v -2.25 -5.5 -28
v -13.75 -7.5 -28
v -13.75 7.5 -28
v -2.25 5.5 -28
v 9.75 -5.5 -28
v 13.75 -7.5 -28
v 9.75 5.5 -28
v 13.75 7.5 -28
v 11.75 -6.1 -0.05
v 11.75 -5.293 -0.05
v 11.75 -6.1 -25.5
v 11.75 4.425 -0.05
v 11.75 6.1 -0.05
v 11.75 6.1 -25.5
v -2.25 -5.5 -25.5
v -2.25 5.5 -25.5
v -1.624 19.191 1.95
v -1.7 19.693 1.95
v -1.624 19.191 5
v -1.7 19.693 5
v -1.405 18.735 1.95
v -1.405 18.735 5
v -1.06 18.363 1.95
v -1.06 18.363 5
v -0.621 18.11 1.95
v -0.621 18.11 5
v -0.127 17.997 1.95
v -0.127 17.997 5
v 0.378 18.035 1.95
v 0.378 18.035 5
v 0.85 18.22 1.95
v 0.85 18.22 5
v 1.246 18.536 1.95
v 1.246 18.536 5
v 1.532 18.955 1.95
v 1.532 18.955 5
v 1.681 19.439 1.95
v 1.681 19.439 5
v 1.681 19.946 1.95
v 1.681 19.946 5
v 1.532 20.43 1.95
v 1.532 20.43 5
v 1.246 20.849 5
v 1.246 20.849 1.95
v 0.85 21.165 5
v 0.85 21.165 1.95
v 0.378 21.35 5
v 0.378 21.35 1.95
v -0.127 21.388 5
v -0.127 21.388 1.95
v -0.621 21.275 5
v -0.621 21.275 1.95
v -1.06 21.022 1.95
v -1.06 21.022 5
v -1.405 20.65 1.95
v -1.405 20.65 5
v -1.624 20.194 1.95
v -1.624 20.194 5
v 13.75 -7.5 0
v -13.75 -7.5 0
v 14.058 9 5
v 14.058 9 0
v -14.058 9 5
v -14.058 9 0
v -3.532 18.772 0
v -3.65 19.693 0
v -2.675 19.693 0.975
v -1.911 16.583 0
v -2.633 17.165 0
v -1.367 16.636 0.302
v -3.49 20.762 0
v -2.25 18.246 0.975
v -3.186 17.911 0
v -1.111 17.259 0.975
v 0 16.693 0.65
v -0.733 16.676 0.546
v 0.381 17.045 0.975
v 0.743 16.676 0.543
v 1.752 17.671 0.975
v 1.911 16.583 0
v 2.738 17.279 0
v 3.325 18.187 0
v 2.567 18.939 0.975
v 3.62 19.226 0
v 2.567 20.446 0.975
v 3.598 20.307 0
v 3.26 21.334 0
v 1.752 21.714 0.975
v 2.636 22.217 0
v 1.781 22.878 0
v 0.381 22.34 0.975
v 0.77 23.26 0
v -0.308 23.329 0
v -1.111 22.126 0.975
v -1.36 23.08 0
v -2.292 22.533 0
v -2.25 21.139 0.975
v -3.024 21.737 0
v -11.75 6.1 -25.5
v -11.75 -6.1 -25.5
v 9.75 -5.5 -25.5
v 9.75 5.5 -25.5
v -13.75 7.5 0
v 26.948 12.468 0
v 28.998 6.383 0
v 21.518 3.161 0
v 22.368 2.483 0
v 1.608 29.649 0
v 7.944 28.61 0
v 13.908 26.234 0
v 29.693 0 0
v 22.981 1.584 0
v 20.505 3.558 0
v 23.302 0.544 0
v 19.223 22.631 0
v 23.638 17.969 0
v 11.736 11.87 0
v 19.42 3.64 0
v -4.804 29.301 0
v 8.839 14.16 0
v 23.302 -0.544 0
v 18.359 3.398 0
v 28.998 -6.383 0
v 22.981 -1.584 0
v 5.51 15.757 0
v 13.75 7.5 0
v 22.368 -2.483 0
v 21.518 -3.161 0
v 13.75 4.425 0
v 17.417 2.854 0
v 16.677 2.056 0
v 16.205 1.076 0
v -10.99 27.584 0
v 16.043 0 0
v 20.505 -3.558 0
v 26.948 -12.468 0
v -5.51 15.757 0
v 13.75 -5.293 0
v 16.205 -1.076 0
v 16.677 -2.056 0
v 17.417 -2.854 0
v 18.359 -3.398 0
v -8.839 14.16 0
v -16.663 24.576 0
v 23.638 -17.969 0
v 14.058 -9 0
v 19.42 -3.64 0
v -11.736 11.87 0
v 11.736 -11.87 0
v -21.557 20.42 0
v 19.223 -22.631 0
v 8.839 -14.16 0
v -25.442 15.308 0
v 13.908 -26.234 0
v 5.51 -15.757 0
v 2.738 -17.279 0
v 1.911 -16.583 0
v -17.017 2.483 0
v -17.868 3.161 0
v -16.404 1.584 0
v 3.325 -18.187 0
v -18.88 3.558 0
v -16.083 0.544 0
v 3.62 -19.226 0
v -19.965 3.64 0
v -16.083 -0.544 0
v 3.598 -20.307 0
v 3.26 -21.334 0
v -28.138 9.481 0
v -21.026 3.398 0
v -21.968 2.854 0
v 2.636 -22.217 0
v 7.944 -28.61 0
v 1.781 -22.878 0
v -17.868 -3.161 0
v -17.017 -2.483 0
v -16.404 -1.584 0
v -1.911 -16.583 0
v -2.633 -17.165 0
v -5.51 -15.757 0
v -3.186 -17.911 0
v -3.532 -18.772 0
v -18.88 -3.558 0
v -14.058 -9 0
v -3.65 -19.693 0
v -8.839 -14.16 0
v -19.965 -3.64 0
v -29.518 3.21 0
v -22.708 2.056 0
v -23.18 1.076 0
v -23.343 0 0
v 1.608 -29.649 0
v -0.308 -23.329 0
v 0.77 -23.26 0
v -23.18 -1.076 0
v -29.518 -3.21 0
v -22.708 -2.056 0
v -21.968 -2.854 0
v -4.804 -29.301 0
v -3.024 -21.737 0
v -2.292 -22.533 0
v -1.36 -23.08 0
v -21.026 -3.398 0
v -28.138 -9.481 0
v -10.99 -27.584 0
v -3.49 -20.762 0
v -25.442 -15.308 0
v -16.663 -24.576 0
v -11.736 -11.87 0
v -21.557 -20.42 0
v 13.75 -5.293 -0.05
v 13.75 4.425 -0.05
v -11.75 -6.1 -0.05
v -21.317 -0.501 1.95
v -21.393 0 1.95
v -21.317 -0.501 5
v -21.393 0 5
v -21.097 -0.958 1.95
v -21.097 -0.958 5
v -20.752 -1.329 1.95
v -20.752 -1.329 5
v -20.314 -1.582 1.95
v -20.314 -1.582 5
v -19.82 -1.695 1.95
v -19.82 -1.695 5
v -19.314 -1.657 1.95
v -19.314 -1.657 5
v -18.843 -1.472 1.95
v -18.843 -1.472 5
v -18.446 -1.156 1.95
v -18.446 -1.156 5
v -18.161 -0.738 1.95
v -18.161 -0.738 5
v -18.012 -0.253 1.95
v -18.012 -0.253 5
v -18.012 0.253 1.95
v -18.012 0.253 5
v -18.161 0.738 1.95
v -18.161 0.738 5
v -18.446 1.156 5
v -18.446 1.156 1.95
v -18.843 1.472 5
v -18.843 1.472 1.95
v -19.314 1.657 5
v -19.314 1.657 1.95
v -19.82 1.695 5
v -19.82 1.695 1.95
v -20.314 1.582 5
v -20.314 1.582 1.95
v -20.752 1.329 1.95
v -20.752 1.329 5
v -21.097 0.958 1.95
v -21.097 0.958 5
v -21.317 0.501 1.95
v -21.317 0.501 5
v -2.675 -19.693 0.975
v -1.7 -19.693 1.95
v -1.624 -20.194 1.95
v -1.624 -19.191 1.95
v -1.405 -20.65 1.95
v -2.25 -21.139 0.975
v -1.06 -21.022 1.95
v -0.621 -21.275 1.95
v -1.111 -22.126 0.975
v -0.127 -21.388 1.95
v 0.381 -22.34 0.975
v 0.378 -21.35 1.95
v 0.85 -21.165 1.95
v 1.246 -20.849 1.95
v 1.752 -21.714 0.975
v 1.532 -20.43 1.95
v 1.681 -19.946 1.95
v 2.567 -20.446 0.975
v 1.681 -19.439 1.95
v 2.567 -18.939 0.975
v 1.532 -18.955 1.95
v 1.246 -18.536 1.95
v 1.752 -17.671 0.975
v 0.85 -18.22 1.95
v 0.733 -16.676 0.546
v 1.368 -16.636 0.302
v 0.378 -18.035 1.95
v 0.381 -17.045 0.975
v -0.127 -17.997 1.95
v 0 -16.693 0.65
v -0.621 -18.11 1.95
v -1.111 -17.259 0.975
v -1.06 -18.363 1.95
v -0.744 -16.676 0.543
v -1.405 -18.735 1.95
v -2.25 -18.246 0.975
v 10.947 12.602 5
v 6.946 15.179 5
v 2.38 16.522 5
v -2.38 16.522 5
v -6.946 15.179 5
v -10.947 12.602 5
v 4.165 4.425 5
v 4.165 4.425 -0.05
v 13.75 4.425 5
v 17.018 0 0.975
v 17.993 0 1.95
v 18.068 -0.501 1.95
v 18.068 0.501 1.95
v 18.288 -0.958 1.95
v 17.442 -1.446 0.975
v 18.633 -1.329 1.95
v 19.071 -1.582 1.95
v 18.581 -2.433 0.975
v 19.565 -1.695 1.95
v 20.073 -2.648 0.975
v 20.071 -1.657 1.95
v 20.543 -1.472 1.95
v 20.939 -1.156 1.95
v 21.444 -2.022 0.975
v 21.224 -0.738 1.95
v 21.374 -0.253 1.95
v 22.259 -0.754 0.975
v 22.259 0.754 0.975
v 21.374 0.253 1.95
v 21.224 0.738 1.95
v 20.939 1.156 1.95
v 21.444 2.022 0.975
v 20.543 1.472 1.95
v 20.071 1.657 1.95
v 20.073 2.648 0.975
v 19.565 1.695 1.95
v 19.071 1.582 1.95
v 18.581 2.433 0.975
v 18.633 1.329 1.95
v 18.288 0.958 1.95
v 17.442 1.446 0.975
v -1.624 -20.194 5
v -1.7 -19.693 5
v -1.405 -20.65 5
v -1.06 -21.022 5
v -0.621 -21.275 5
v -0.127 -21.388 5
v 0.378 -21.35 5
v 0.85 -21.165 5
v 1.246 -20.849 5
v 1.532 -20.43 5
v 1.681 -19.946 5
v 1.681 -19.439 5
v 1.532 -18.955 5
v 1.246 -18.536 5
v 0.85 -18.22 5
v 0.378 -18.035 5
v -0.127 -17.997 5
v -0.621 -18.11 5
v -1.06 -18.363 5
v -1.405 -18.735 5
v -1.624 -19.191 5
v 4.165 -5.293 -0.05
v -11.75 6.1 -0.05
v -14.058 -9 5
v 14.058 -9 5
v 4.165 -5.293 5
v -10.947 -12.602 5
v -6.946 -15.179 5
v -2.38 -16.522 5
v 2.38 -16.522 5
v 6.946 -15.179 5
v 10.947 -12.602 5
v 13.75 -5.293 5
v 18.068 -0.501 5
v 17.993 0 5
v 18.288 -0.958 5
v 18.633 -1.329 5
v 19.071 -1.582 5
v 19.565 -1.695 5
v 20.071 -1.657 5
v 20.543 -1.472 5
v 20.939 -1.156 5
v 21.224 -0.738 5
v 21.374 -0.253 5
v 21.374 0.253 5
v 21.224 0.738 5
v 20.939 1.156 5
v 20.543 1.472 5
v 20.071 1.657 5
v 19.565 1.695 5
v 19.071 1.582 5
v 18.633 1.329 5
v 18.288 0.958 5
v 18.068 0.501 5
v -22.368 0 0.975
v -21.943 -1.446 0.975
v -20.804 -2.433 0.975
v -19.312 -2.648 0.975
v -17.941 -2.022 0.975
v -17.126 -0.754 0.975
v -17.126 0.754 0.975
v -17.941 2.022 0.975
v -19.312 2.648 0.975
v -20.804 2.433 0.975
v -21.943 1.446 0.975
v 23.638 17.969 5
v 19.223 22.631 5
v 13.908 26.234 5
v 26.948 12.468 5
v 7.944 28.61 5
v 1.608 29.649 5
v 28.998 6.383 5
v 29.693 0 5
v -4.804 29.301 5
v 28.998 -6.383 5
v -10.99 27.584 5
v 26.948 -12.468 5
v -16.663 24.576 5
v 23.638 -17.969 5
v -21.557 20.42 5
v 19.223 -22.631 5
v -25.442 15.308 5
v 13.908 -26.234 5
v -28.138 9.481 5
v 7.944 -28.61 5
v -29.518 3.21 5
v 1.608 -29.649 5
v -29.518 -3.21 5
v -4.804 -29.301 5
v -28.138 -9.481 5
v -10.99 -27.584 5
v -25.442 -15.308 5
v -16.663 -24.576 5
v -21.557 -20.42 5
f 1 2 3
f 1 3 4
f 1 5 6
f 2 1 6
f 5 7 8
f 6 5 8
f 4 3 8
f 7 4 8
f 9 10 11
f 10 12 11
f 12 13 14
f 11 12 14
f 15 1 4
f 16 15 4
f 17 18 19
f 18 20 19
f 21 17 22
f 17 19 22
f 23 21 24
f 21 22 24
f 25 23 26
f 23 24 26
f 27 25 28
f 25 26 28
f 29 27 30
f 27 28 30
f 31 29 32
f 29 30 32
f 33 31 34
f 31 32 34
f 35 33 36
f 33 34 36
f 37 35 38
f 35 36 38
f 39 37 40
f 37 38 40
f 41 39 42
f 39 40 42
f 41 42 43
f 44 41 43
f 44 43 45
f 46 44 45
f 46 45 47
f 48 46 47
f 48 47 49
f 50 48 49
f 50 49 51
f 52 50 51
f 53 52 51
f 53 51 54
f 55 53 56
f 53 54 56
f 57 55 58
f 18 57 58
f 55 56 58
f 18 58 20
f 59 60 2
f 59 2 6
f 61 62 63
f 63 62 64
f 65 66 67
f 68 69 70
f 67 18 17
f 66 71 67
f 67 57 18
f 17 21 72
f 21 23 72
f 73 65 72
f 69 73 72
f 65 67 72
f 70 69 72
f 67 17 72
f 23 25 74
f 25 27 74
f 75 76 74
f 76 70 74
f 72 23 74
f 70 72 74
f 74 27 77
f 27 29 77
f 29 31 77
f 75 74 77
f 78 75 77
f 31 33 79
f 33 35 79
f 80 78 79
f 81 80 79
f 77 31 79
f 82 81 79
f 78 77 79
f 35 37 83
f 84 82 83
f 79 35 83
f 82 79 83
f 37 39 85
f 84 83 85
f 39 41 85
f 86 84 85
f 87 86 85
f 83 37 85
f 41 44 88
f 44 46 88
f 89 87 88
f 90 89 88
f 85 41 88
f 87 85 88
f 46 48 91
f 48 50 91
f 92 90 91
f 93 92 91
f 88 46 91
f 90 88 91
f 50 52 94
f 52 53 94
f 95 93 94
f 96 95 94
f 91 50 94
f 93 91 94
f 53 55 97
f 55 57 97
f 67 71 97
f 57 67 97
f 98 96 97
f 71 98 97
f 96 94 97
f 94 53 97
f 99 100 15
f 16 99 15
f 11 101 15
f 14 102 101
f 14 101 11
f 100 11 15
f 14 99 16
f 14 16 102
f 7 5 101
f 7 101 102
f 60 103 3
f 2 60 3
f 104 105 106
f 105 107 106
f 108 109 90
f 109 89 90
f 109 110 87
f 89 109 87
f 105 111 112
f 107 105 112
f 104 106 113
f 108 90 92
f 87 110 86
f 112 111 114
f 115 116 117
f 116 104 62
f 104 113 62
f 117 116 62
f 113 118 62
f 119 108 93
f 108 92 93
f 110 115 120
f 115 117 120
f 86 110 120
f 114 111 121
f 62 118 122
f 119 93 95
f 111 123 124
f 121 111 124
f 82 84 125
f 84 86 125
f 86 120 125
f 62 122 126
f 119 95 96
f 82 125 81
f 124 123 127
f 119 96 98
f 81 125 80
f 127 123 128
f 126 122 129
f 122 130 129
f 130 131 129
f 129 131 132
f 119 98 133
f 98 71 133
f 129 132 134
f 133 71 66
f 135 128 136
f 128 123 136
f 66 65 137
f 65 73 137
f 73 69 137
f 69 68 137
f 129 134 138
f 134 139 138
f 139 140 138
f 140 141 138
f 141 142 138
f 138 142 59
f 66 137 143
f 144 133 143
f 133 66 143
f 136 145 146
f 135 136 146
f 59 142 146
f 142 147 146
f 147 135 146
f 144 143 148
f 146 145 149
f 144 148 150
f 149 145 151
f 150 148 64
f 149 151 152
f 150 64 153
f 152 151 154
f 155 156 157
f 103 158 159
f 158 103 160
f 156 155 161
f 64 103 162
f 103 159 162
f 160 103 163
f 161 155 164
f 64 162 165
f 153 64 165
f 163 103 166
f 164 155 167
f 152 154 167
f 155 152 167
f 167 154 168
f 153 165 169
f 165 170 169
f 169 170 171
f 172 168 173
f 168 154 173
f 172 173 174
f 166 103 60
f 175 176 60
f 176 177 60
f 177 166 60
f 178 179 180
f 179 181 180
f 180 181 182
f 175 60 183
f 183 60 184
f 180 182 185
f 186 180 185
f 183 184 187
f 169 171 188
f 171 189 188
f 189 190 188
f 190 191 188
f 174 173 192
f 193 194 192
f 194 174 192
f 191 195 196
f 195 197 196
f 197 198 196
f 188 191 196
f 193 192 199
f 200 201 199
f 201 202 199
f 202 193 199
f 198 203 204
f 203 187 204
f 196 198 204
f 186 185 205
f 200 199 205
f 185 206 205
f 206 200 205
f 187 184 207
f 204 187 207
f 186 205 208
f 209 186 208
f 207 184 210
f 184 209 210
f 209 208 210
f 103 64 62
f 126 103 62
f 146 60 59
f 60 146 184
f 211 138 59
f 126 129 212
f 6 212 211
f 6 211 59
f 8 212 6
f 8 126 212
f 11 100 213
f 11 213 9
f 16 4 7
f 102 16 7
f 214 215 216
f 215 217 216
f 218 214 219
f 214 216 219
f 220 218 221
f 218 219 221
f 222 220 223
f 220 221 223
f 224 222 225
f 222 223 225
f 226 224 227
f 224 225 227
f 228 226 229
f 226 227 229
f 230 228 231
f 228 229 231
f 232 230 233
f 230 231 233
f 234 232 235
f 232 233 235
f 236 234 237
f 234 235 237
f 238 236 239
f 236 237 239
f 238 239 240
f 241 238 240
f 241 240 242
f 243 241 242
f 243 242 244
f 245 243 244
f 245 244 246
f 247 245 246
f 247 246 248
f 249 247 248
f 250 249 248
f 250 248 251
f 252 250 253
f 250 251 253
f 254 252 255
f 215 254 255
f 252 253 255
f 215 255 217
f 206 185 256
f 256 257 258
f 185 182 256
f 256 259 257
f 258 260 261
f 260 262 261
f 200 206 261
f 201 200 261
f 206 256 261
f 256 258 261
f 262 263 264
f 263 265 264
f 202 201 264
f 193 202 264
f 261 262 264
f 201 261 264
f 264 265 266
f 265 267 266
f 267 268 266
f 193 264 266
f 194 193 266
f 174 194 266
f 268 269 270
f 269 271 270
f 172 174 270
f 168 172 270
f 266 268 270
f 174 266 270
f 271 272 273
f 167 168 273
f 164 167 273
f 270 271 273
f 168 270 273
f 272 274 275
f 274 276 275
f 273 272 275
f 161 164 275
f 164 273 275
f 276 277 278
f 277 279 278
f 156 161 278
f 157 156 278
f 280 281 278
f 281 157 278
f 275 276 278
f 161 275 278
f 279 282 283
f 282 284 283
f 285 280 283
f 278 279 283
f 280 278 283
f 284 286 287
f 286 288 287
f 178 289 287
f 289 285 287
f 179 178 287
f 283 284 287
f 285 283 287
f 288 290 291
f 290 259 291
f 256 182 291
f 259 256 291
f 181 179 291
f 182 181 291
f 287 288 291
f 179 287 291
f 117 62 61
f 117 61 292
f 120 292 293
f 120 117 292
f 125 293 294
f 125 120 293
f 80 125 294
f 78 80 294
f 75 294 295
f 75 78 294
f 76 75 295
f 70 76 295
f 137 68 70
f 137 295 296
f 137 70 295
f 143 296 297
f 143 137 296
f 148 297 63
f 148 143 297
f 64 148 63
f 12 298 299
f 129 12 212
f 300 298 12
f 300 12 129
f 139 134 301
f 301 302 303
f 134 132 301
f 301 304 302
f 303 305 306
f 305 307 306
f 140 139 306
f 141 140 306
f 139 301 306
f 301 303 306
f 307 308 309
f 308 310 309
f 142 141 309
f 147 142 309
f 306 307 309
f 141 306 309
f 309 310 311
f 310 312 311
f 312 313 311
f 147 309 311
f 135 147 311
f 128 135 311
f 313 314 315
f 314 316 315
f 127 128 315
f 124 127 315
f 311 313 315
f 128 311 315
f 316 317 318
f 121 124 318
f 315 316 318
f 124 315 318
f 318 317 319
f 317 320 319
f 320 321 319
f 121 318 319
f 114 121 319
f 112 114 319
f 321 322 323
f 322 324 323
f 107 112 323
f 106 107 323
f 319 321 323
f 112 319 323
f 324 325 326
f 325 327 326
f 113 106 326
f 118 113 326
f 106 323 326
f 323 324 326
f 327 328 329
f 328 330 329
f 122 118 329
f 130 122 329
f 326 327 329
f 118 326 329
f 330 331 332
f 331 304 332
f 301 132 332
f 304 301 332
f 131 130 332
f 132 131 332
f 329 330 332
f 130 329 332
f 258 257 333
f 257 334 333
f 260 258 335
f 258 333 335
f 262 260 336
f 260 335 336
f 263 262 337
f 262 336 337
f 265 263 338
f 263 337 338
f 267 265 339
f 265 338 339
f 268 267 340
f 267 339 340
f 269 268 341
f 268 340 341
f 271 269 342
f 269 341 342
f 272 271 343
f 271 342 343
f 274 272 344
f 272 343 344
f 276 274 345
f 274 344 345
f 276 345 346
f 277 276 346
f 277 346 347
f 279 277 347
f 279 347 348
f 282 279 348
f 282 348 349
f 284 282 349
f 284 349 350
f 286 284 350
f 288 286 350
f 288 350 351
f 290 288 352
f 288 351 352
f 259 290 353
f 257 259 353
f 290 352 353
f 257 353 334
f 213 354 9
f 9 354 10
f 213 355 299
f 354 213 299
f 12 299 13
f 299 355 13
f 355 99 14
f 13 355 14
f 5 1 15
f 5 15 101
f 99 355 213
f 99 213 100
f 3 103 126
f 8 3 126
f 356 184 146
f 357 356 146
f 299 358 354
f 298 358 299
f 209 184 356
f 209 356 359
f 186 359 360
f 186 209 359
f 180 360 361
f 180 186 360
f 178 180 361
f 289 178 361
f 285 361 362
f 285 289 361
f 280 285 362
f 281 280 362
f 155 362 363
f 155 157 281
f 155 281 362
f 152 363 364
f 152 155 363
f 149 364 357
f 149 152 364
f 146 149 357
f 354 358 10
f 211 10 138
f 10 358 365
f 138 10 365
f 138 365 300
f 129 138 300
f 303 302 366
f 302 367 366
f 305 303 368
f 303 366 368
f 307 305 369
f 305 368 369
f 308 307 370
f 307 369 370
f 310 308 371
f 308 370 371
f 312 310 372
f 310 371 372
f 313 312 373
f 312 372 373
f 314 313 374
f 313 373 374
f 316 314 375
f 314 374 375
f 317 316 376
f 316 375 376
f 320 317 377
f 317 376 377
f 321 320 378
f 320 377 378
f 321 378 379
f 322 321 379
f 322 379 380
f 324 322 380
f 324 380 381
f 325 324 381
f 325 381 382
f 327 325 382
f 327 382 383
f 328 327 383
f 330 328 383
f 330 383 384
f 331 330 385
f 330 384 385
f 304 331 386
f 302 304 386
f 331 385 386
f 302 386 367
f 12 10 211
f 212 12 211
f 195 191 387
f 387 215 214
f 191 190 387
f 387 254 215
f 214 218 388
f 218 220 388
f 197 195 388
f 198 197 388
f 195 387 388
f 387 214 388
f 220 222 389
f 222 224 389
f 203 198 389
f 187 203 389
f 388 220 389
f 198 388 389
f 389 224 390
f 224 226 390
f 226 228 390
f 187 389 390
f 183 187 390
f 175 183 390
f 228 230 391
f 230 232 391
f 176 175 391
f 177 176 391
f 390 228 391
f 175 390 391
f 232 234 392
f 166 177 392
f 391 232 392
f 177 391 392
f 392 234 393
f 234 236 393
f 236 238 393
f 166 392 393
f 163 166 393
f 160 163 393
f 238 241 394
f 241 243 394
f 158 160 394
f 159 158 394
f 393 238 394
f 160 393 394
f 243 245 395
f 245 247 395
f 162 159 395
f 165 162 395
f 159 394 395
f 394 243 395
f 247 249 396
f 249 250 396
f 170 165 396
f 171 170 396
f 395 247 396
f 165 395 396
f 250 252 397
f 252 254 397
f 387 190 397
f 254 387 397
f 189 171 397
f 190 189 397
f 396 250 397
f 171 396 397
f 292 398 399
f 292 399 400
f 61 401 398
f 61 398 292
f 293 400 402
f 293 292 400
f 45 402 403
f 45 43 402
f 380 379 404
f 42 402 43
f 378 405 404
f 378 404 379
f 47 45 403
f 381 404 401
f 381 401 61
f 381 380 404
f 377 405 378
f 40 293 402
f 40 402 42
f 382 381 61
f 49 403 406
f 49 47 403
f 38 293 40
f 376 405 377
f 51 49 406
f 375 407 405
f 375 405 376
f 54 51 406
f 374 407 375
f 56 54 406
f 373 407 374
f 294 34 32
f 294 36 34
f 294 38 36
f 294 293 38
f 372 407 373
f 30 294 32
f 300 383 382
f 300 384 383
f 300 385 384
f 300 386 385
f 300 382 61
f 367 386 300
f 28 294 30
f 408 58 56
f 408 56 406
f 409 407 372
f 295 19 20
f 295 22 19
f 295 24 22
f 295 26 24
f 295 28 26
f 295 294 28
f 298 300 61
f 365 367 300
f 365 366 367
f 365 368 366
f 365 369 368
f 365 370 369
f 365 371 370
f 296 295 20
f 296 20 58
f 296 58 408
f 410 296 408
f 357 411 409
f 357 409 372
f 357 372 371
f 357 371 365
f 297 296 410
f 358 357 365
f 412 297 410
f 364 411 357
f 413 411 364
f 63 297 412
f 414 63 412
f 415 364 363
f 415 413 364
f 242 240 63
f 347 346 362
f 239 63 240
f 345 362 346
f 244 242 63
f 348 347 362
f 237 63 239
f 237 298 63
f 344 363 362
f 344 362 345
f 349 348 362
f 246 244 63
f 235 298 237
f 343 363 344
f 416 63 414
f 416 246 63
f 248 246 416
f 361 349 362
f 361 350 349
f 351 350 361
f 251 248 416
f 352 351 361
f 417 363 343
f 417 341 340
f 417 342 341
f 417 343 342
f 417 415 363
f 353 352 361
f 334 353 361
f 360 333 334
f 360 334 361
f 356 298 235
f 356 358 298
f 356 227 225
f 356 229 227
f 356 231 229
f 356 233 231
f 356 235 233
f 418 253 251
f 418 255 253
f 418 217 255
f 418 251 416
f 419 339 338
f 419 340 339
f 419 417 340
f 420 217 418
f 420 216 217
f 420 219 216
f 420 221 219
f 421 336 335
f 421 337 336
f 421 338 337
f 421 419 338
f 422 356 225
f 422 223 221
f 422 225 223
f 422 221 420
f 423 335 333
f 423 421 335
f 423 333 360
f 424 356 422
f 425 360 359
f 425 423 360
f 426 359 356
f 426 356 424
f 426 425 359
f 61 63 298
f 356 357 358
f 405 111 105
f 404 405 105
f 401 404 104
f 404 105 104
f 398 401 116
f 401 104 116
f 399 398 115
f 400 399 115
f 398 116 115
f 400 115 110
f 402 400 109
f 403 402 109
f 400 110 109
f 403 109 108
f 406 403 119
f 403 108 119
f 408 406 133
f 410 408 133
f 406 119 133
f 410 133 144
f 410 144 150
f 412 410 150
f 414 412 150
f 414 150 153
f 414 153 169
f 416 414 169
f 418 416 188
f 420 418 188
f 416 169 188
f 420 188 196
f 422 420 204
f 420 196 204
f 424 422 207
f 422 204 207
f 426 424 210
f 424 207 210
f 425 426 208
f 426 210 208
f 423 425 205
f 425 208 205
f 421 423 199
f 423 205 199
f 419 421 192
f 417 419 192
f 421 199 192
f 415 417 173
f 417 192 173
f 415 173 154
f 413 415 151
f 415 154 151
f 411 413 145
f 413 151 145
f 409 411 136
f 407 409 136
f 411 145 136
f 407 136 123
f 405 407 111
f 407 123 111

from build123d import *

# Parameters (mm, degrees)
SKETCH1_R                                       = 29.692527183
SKETCH1_R_2                                     = 22.692527183
SKETCH1_R_3                                     = 19.692527183
SKETCH1_R_4                                     = 16.692527183
BOSS_EXTRUDE1_DEPTH                             = 5
SKETCH9_W                                       = 27.5
SKETCH9_H                                       = 28
BOSS_EXTRUDE2_DEPTH                             = 7.5
SKETCH10_W                                      = 23.5
SKETCH10_H                                      = 25.45
CUT_EXTRUDE1_DEPTH                              = 6.1
SKETCH12_W                                      = 12
SKETCH12_H                                      = 11
CUT_EXTRUDE2_DEPTH                              = 3
CUT_EXTRUDE3_REACH                              = 55.407
SKETCH11_W                                      = 9.585282086
SKETCH11_H                                      = 9.717675131
CSK_FOR_M3_FLAT_HEAD_MACHINE_SCREW1_D           = 3.4
CSK_FOR_M3_FLAT_HEAD_MACHINE_SCREW1_DEPTH       = 12
CSK_FOR_M3_FLAT_HEAD_MACHINE_SCREW1_CSINK_D     = 7.3
CSK_FOR_M3_FLAT_HEAD_MACHINE_SCREW1_CSINK_ANGLE = 90
CSK_FOR_M3_FLAT_HEAD_MACHINE_SCREW1_TIP         = 1.021463052


with BuildPart() as part:
    # Sketch1 → Boss-Extrude1 (new body)
    # profile 1 of 4: a face of its own
    with BuildSketch(Plane(origin=(0, 0, 0), x_dir=(-1, 0, 0), z_dir=(0, 0, 1))):
        with Locations(Location((0, 0, 0), (0, 0, 180))):
            Circle(SKETCH1_R)
        Circle(SKETCH1_R_2, mode=Mode.SUBTRACT)
    # profile 2 of 4: a face of its own
    with BuildSketch(Plane(origin=(0, 0, 0), x_dir=(-1, 0, 0), z_dir=(0, 0, 1))):
        Circle(SKETCH1_R_2)
        Circle(SKETCH1_R_3, mode=Mode.SUBTRACT)
    # profile 3 of 4: a face of its own
    with BuildSketch(Plane(origin=(0, 0, 0), x_dir=(-1, 0, 0), z_dir=(0, 0, 1))):
        Circle(SKETCH1_R_3)
        Circle(SKETCH1_R_4, mode=Mode.SUBTRACT)
    # profile 4 of 4: a face of its own
    with BuildSketch(Plane(origin=(0, 0, 0), x_dir=(-1, 0, 0), z_dir=(0, 0, 1))):
        with BuildLine():
            Line((14.058465911, 9), (-14.058465911, 9))
            ThreePointArc((-14.058465911, 9), (-16.692527183, 0), (-14.058465911, -9))
            Line((-14.058465911, -9), (14.058465911, -9))
            ThreePointArc((14.058465911, -9), (16.020483578, -4.688770595), (16.692527183, 0))
            ThreePointArc((16.692527183, 0), (16.020483578, 4.688770595), (14.058465911, 9))
        make_face()
    extrude(amount=BOSS_EXTRUDE1_DEPTH)

    # Sketch9 → Boss-Extrude2 (add, symmetric)
    with BuildSketch(Plane(origin=(0, 0, 0), x_dir=(1, 0, 0), z_dir=(0, 1, 0))):
        with Locations((0, 14)):
            Rectangle(SKETCH9_W, SKETCH9_H)
    extrude(amount=BOSS_EXTRUDE2_DEPTH, both=True)

    # Sketch10 → Cut-Extrude1 (cut, symmetric)
    with BuildSketch(Plane(origin=(0, 0, 0), x_dir=(1, 0, 0), z_dir=(0, 1, 0))):
        with Locations((0, 12.775)):
            Rectangle(SKETCH10_W, SKETCH10_H)
    extrude(amount=CUT_EXTRUDE1_DEPTH, both=True, mode=Mode.SUBTRACT)

    # Sketch12 → Cut-Extrude2 (cut)
    with BuildSketch(Plane.XY.offset(-28)):
        with Locations((3.75, 0)):
            Rectangle(SKETCH12_W, SKETCH12_H)
    extrude(amount=CUT_EXTRUDE2_DEPTH, mode=Mode.SUBTRACT)

    # Cut-Extrude3: up to this face of the body (flat: up to its plane)
    cut_extrude3_end = Plane(part.part.faces().sort_by_distance((0, 0, -0.05))[0])
    # Sketch11 → Cut-Extrude3 (cut, up to the picked face)
    with BuildSketch(Plane.XY.offset(5), mode=Mode.PRIVATE) as cut_extrude3_sk1:
        with Locations((8.957358957, -0.433824782)):
            Rectangle(SKETCH11_W, SKETCH11_H)
    cut_extrude3_tool1 = split(extrude(cut_extrude3_sk1.sketch, amount=-CUT_EXTRUDE3_REACH, mode=Mode.PRIVATE), bisect_by=cut_extrude3_end, keep=Keep.BOTH, mode=Mode.PRIVATE)
    add(cut_extrude3_tool1.solids().sort_by(Axis((8.957359, -0.433825, 5), (0, 0, -1)))[0], mode=Mode.SUBTRACT)

    # CSK for M3 Flat Head Machine Screw1
    with Locations(Plane(origin=(0, 0, 0), x_dir=(1, 0, 0), z_dir=(0, 0, -1))):
        with Locations((-19.692527183, 0), (0, 19.692527183), (0, -19.692527183), (19.692527183, 0)):
            CounterSinkHole(CSK_FOR_M3_FLAT_HEAD_MACHINE_SCREW1_D / 2, CSK_FOR_M3_FLAT_HEAD_MACHINE_SCREW1_CSINK_D / 2, depth=CSK_FOR_M3_FLAT_HEAD_MACHINE_SCREW1_DEPTH, counter_sink_angle=CSK_FOR_M3_FLAT_HEAD_MACHINE_SCREW1_CSINK_ANGLE)
            with Locations((0, 0, -(CSK_FOR_M3_FLAT_HEAD_MACHINE_SCREW1_DEPTH + CSK_FOR_M3_FLAT_HEAD_MACHINE_SCREW1_TIP / 2))):  # 118° drill point
                Cone(0, CSK_FOR_M3_FLAT_HEAD_MACHINE_SCREW1_D / 2, CSK_FOR_M3_FLAT_HEAD_MACHINE_SCREW1_TIP, mode=Mode.SUBTRACT)


solid = part.part
